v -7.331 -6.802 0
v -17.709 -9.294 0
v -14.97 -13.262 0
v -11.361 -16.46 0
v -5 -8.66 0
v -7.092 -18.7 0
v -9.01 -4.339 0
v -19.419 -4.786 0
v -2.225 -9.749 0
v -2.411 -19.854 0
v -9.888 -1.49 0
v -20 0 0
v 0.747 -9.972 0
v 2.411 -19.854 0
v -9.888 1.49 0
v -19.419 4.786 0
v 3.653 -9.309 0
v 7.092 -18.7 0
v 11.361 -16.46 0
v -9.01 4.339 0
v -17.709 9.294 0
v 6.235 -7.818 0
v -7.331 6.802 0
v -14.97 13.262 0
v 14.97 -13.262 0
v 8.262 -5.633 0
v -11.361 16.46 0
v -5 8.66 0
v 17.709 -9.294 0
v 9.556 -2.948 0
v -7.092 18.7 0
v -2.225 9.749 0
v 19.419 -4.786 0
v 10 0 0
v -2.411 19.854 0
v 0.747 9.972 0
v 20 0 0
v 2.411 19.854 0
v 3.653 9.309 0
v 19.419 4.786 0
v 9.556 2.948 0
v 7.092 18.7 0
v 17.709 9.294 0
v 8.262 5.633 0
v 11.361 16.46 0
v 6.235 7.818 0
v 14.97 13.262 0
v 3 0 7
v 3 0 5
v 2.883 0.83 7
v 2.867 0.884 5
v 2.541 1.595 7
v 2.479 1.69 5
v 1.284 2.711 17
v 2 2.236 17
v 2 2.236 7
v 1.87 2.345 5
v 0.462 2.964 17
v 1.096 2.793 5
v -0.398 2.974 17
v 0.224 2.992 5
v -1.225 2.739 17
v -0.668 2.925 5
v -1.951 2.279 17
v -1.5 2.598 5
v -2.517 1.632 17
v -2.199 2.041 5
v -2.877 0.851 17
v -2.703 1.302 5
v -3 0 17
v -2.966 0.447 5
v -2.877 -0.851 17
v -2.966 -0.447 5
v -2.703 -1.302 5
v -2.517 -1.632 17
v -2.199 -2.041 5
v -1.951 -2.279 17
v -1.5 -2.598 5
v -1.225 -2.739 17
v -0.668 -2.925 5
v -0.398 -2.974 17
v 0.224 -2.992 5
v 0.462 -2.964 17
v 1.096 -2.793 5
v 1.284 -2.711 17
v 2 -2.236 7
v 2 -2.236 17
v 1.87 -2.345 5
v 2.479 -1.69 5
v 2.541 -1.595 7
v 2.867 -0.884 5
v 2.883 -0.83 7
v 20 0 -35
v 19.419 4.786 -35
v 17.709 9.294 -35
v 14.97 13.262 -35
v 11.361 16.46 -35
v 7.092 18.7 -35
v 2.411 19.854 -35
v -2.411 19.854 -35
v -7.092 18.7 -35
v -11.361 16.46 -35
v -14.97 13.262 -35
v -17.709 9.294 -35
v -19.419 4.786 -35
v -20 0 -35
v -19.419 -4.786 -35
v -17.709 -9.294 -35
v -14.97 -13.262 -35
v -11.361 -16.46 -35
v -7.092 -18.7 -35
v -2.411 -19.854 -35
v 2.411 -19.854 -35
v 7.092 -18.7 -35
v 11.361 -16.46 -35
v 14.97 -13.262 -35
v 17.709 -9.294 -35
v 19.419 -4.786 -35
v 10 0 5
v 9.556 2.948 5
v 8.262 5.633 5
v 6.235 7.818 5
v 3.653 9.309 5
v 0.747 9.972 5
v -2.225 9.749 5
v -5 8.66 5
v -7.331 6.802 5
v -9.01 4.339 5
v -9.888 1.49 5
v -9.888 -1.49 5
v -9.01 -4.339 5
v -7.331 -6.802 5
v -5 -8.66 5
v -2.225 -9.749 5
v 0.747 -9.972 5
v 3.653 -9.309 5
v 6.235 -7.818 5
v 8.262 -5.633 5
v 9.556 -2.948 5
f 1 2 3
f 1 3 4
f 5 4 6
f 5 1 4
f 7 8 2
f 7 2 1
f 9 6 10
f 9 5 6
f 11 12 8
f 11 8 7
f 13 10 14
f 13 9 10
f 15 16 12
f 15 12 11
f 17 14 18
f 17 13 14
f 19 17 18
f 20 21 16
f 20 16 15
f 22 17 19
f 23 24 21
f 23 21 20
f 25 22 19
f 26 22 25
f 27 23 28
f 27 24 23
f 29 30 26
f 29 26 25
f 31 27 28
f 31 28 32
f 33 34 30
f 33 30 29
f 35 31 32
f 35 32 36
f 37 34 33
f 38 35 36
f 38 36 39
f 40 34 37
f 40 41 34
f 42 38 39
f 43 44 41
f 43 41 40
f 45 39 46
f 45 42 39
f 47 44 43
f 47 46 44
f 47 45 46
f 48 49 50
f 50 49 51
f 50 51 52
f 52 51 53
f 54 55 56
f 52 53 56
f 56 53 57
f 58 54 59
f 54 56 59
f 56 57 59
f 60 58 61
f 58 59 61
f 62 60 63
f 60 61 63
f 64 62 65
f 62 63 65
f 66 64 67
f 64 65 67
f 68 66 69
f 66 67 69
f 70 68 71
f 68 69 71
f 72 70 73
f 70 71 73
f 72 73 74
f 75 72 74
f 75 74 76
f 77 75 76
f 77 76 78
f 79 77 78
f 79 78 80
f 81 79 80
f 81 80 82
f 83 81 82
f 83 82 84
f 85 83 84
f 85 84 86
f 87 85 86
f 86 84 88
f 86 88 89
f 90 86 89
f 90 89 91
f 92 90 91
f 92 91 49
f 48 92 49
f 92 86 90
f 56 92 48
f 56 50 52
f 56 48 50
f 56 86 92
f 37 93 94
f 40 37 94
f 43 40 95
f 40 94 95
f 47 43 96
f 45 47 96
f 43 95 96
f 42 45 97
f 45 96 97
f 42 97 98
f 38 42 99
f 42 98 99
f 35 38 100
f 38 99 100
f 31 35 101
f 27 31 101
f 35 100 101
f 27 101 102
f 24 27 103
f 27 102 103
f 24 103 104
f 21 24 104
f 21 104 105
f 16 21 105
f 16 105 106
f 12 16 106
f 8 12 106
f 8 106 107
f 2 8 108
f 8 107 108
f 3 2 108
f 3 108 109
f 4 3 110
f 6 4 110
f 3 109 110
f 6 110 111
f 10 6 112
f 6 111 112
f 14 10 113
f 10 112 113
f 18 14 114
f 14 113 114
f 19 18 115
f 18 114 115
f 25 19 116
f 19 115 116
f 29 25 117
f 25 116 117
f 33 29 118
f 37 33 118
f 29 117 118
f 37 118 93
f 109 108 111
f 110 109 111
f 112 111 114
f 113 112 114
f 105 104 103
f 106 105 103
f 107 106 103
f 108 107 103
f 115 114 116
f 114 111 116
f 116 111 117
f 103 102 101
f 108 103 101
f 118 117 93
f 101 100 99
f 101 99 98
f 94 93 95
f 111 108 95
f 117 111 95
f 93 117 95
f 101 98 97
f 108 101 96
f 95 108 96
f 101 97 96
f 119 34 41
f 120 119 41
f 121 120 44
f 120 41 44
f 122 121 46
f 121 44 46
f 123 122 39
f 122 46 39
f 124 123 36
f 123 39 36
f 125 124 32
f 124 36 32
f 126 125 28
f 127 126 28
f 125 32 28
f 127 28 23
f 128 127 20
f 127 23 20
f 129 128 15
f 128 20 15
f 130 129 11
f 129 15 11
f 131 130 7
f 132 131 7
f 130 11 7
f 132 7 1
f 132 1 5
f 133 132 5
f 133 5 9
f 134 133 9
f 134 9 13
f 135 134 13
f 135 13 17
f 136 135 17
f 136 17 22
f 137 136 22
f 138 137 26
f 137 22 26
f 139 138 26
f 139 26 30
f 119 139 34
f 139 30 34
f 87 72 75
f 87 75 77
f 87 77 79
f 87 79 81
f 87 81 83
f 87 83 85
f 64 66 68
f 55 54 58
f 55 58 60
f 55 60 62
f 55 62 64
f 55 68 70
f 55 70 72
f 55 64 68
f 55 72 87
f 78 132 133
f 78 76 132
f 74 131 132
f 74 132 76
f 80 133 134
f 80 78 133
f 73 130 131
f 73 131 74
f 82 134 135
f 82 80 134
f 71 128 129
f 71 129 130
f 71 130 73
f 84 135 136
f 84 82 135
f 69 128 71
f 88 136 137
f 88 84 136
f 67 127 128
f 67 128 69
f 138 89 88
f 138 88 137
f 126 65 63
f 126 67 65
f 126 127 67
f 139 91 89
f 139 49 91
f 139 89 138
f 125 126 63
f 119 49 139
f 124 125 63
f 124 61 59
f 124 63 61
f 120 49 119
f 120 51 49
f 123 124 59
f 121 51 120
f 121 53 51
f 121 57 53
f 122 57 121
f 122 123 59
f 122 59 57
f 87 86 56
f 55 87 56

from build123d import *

# Parameters (mm, degrees)
BOX_W             = 10
BOX_H             = 10
BOX_DEPTH         = 10
CYLINDER001_R     = 10
CYLINDER001_DEPTH = 5
CYLINDER002_R     = 3
CYLINDER002_DEPTH = 12
CYLINDER_R        = 20
CYLINDER_DEPTH    = 35


with BuildPart() as cube:
    # Box → Box (new body)
    with BuildSketch(Plane(origin=(2, -5, 7), x_dir=(1, 0, 0), z_dir=(0, 0, 1))):
        with Locations((5, 5)):
            Rectangle(BOX_W, BOX_H)
    extrude(amount=BOX_DEPTH)


with BuildPart() as cylinder001:
    # Cylinder001 → Cylinder001 (new body)
    with BuildSketch(Plane.XY):
        Circle(CYLINDER001_R)
    extrude(amount=CYLINDER001_DEPTH)


with BuildPart() as cylinder002:
    # Cylinder002 → Cylinder002 (new body)
    with BuildSketch(Plane.XY.offset(5)):
        Circle(CYLINDER002_R)
    extrude(amount=CYLINDER002_DEPTH)


with BuildPart() as cut:
    # Cylinder → Cylinder (new body)
    with BuildSketch(Plane.XY.offset(-35)):
        Circle(CYLINDER_R)
    extrude(amount=CYLINDER_DEPTH)

    # Fusion: union Cylinder001, Cylinder002
    add(cylinder001.part)
    add(cylinder002.part)

    # Cut: cut Cube
    add(cube.part, mode=Mode.SUBTRACT)


solid = cut.part
